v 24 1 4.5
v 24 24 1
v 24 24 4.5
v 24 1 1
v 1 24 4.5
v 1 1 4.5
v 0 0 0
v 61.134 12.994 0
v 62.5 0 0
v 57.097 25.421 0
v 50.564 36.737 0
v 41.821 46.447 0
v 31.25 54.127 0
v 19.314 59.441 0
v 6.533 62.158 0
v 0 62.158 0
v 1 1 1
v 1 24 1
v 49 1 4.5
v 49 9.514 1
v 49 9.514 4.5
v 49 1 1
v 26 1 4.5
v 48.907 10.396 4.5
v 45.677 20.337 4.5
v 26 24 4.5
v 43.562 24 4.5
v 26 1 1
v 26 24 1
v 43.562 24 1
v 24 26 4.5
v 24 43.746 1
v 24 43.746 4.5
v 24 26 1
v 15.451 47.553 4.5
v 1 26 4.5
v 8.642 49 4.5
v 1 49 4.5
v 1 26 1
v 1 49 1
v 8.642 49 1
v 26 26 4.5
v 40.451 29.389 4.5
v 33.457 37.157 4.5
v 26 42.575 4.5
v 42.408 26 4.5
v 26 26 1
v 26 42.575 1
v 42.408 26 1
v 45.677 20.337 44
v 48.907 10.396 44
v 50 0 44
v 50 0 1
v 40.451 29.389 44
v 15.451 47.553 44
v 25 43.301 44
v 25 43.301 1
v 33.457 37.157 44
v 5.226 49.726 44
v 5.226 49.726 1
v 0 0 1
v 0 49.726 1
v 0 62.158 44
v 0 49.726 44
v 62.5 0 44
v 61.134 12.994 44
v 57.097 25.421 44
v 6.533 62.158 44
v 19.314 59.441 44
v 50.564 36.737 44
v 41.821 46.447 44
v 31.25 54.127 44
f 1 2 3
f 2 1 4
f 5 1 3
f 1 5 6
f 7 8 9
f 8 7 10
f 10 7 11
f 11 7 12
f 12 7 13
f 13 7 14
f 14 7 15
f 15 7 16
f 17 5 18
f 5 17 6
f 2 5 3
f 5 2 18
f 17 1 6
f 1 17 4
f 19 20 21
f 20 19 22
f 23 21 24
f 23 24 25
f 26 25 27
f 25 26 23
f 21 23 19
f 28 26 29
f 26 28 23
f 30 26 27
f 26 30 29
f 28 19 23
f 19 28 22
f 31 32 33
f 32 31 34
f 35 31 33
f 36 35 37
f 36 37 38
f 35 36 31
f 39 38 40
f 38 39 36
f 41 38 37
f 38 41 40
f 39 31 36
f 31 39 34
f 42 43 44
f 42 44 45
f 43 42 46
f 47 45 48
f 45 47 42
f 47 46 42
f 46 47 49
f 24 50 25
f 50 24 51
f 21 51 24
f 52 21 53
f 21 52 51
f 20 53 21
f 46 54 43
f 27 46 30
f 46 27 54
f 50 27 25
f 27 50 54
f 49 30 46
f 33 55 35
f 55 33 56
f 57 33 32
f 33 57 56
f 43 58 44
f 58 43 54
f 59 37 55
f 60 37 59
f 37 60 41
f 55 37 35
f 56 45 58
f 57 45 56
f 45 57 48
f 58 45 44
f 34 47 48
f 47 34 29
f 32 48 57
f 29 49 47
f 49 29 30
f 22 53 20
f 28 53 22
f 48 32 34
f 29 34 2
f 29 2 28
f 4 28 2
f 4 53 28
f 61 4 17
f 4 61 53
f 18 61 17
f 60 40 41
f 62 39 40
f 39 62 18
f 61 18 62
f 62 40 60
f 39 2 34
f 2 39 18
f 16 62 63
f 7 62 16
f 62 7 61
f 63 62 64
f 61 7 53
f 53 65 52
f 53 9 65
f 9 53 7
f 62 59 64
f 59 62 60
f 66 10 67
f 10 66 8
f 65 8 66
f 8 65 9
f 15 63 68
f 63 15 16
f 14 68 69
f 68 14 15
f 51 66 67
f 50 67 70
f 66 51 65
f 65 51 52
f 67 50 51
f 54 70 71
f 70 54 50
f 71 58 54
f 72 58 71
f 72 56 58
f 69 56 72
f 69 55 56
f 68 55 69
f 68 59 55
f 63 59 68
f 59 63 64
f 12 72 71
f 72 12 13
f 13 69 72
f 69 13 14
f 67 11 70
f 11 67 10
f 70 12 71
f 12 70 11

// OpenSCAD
color("LightGray") {
    intersection() {
        union() {
            translate([1,1,0]) cube([23,23,4.5]);
            translate([25+1,1,0]) cube([23,23,4.5]);
            translate([1,25+1,0]) cube([23,23,4.5]);
            translate([25+1,25+1,0]) cube([23,23,4.5]);
        }
        cylinder(50,50,50);
    }
}

color("Grey") {
    intersection() {
        cube([50,50,7-6]);
        cylinder(50,50,50);
    }
    intersection() {
        difference() {
            cylinder(50-6,50+12.5,50+12.5);
            translate([0,0,-1]) cylinder(52,50,50);
        }
        cube([50+12.5,50+12.5,50]);
    }
}
